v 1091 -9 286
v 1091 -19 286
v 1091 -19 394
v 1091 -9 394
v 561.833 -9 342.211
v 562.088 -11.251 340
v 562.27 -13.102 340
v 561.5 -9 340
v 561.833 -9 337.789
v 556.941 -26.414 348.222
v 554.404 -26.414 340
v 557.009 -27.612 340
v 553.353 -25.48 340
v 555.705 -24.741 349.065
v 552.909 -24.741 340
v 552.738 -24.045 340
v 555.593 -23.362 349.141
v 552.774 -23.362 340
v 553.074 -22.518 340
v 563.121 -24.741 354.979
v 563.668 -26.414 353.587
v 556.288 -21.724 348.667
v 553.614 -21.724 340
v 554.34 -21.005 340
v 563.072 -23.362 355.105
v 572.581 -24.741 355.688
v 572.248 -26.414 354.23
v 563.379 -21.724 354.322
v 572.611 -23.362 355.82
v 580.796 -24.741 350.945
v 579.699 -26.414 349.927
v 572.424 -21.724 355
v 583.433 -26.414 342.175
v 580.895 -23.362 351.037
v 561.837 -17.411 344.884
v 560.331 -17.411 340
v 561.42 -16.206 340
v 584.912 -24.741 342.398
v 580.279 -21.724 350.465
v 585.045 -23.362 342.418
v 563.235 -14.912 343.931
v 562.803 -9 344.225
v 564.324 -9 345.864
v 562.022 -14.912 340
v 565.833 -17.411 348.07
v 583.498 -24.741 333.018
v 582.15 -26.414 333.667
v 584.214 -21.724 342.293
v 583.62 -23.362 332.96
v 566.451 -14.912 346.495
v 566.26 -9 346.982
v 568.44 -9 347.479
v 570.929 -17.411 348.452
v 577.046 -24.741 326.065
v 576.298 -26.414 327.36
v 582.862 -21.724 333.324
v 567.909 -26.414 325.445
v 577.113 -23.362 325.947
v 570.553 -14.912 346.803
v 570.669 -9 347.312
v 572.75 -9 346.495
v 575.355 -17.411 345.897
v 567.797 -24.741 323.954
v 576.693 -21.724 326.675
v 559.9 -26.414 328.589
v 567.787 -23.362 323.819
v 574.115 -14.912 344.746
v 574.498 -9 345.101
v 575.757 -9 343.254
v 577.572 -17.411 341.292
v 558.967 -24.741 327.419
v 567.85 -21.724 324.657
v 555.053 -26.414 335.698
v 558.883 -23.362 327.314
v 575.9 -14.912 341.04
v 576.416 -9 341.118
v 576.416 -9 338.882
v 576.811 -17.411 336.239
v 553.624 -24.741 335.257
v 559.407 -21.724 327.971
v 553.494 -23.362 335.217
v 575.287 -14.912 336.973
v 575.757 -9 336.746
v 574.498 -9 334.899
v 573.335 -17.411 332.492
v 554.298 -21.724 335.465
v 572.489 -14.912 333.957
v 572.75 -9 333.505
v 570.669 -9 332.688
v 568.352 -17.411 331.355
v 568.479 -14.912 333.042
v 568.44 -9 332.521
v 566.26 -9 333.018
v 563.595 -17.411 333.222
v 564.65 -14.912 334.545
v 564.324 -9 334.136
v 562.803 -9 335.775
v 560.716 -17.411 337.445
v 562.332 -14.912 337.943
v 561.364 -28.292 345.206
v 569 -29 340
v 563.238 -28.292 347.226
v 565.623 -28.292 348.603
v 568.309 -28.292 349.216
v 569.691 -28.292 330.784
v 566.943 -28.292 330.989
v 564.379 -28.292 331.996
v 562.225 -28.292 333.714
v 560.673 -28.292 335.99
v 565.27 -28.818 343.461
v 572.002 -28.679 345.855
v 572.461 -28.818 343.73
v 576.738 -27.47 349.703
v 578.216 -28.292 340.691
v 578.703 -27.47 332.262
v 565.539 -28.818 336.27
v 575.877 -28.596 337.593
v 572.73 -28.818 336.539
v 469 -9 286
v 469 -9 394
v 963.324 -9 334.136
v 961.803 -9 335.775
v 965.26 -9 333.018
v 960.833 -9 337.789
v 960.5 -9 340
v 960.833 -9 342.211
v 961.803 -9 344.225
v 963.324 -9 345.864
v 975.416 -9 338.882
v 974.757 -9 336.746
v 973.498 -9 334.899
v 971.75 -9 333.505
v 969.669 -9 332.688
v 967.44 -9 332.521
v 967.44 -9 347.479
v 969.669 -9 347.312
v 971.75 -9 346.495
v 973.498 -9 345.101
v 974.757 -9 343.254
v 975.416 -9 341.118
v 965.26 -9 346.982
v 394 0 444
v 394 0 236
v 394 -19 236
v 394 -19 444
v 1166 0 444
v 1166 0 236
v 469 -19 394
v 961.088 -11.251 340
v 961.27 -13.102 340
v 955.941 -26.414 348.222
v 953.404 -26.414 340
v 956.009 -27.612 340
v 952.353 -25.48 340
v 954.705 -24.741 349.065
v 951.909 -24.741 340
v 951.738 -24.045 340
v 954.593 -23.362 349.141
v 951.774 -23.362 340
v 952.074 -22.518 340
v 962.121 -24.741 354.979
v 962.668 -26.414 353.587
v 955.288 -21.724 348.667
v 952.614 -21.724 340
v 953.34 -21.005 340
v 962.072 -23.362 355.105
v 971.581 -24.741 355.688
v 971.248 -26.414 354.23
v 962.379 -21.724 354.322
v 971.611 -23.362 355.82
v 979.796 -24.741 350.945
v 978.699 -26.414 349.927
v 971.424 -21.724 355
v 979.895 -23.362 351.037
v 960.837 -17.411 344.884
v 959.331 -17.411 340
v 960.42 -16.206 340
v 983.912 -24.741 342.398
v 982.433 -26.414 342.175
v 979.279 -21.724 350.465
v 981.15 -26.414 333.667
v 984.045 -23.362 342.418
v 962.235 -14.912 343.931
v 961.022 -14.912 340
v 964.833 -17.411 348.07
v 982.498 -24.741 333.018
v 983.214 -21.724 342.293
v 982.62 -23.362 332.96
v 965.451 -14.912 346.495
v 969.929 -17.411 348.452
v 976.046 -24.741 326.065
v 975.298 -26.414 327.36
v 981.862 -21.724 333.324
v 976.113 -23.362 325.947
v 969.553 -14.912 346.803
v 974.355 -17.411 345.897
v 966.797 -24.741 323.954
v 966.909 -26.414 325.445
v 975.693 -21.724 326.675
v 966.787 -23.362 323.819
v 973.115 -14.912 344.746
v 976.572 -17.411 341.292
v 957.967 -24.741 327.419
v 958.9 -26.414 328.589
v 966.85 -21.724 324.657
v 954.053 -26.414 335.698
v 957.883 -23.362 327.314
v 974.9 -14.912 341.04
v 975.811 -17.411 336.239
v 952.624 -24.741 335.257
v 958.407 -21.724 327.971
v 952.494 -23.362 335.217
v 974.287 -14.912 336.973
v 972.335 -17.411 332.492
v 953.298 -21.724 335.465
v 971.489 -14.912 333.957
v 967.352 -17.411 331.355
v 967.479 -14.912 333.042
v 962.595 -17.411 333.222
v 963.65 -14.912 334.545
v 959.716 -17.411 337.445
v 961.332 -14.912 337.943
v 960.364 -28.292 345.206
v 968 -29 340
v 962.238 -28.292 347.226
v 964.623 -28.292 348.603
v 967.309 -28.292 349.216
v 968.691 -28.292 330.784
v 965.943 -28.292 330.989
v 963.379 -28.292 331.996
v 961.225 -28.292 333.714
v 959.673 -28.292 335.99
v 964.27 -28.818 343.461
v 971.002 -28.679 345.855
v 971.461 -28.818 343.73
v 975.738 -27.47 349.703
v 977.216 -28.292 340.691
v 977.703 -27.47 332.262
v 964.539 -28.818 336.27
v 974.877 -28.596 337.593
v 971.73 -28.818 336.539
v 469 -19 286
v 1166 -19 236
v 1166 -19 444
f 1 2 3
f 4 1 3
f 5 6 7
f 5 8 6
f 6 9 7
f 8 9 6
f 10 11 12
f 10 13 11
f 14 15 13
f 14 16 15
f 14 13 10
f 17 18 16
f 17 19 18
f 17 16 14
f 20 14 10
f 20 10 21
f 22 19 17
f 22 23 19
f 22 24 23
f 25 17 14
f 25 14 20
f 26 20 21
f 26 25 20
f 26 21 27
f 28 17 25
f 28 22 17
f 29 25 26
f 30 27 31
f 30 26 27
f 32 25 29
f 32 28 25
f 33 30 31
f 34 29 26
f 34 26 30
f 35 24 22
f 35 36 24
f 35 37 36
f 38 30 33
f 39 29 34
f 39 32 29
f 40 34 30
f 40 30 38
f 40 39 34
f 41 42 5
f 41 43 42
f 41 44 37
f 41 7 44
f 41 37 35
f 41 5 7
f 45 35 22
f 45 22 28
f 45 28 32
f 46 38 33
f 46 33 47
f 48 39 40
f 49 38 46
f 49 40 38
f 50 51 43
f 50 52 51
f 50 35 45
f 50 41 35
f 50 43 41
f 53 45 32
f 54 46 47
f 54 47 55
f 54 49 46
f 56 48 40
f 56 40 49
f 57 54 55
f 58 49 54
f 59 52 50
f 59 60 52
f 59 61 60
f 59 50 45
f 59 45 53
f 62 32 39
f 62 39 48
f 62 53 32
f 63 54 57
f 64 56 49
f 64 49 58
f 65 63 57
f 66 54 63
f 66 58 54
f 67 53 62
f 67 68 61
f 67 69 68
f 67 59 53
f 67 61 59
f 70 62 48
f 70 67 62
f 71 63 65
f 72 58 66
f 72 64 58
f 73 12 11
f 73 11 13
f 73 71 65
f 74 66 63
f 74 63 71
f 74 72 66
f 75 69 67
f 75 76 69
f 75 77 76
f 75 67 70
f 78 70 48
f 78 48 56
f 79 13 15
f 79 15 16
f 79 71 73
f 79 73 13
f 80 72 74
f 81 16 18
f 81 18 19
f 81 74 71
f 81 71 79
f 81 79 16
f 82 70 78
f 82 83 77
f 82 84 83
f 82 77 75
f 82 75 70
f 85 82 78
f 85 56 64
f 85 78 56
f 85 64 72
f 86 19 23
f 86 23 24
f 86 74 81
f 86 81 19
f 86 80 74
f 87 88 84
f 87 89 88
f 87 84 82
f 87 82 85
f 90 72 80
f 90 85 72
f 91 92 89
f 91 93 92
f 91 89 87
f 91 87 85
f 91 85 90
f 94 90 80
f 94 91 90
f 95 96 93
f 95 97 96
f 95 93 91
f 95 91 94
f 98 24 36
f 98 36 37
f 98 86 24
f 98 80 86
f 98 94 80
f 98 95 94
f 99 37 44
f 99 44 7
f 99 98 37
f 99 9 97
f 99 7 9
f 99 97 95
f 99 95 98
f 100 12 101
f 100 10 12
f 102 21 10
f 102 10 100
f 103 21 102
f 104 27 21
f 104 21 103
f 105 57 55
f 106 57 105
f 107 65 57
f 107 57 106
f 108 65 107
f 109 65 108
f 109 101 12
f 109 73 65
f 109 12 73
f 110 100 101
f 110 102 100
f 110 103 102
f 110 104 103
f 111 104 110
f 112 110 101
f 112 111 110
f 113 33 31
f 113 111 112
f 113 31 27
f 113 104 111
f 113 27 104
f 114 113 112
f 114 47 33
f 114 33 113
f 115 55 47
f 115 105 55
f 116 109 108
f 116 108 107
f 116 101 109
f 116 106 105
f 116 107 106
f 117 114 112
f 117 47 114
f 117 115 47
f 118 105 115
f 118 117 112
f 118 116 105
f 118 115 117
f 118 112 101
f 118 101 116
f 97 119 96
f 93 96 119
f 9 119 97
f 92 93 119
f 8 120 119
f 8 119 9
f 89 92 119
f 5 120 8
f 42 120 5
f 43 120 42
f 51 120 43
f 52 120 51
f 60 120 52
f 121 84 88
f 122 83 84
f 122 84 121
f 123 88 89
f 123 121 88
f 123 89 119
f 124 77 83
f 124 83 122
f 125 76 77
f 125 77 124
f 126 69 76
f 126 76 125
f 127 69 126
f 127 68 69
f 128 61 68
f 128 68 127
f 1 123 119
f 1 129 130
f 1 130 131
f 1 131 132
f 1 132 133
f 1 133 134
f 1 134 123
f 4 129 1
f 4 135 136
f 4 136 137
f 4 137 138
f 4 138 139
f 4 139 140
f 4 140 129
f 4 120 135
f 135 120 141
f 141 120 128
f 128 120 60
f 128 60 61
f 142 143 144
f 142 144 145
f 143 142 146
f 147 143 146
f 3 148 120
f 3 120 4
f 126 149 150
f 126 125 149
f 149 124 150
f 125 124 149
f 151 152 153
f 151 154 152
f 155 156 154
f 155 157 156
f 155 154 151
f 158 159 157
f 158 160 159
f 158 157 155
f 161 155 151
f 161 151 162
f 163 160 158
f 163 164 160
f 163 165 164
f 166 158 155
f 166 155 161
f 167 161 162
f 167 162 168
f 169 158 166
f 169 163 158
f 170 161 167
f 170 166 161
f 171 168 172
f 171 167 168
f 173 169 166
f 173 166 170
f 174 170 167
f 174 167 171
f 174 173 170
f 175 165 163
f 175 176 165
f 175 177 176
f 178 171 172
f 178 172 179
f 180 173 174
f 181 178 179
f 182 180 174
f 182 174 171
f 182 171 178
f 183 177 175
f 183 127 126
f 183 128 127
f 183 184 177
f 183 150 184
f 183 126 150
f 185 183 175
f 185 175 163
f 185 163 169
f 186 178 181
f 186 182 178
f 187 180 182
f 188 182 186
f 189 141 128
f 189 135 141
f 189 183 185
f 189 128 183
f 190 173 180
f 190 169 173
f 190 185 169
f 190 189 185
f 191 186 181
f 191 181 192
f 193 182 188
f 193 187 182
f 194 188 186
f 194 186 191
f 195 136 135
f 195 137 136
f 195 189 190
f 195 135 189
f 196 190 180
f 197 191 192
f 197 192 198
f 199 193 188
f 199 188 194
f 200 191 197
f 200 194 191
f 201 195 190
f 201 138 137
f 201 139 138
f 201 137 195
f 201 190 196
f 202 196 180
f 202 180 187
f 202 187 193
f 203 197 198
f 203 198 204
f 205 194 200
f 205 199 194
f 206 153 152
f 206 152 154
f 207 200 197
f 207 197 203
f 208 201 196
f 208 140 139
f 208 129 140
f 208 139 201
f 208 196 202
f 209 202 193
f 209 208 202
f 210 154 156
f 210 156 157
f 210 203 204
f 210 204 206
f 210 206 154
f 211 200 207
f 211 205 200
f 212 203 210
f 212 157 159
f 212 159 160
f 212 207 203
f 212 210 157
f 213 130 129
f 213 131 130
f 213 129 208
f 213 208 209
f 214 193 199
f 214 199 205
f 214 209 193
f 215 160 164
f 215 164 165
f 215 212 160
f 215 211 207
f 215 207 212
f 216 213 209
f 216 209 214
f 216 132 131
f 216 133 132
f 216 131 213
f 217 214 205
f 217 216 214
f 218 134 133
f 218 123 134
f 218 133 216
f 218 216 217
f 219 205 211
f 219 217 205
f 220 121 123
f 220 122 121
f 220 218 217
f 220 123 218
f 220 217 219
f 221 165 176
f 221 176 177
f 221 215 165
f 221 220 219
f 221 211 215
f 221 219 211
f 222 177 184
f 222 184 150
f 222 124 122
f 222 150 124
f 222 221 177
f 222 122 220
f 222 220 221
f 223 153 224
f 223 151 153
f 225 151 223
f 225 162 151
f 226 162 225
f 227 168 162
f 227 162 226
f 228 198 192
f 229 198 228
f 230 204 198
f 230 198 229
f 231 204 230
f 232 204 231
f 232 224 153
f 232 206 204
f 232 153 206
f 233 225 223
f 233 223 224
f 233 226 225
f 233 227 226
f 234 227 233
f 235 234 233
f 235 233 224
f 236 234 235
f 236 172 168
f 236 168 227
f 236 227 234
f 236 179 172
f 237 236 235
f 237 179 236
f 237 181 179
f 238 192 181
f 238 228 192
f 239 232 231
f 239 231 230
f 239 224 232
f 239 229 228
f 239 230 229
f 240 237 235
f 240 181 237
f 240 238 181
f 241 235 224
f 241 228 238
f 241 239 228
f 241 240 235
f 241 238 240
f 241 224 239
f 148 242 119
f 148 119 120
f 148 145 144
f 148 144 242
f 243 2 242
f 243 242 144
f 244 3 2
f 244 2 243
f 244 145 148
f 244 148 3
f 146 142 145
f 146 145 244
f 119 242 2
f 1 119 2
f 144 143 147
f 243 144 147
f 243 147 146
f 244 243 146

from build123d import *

# Parameters (mm, degrees)
CLONE2D014_W    = 772
CLONE2D014_H    = 208
PAD015_DEPTH    = 19
SKETCH039_W     = 622
SKETCH039_H     = 108
POCKET015_DEPTH = 10


with BuildPart() as part:
    # Clone2D014 → Pad015 (new body)
    with BuildSketch(Plane.XZ):
        with Locations((386, 104)):
            Rectangle(CLONE2D014_W, CLONE2D014_H)
    extrude(amount=PAD015_DEPTH)

    # Sketch039 (on Face6 of Pad015) → Pocket015 (cut)
    with BuildSketch(Plane.XZ.offset(19)):
        with Locations((386, 104)):
            Rectangle(SKETCH039_W, SKETCH039_H)
    extrude(amount=-POCKET015_DEPTH, mode=Mode.SUBTRACT)

    # Clone2D015 → Revolution008 (revolve)
    with BuildSketch(Plane(origin=(175, -9, 104), x_dir=(1, 0, 0), z_dir=(0, 0, 1))):
        with BuildLine():
            Line((0, 0), (0, -20))
            add(Edge.make_bspline(
                [(0, -20), (-18, -20), (-18, -9.133286), (-4.506424, -9.133286), (-7.5, 0)],
                knots=[0, 0, 0, 0, 0.5, 1, 1, 1, 1], degree=3, weights=[7, 6.116989, 5.810816, 6.060123, 5.999522]))
            Line((-7.5, 0), (0, 0))
        make_face()
    revolve(axis=Axis((175, -9, 104), (0, 1, 0)))

    # Clone2D016 → Revolution009 (revolve)
    with BuildSketch(Plane(origin=(574, -9, 104), x_dir=(1, 0, 0), z_dir=(0, 0, 1))):
        with BuildLine():
            Line((0, 0), (0, -20))
            add(Edge.make_bspline(
                [(0, -20), (-18, -20), (-18, -9.133286), (-4.506424, -9.133286), (-7.5, 0)],
                knots=[0, 0, 0, 0, 0.5, 1, 1, 1, 1], degree=3, weights=[7, 6.116989, 5.810816, 6.060123, 5.999522]))
            Line((-7.5, 0), (0, 0))
        make_face()
    revolve(axis=Axis((574, -9, 104), (0, 1, 0)))


with BuildPart() as part_1:
    # Body019 placement: moved
    add(part.part.moved(Location((394, 0, 236))))


solid = part_1.part
